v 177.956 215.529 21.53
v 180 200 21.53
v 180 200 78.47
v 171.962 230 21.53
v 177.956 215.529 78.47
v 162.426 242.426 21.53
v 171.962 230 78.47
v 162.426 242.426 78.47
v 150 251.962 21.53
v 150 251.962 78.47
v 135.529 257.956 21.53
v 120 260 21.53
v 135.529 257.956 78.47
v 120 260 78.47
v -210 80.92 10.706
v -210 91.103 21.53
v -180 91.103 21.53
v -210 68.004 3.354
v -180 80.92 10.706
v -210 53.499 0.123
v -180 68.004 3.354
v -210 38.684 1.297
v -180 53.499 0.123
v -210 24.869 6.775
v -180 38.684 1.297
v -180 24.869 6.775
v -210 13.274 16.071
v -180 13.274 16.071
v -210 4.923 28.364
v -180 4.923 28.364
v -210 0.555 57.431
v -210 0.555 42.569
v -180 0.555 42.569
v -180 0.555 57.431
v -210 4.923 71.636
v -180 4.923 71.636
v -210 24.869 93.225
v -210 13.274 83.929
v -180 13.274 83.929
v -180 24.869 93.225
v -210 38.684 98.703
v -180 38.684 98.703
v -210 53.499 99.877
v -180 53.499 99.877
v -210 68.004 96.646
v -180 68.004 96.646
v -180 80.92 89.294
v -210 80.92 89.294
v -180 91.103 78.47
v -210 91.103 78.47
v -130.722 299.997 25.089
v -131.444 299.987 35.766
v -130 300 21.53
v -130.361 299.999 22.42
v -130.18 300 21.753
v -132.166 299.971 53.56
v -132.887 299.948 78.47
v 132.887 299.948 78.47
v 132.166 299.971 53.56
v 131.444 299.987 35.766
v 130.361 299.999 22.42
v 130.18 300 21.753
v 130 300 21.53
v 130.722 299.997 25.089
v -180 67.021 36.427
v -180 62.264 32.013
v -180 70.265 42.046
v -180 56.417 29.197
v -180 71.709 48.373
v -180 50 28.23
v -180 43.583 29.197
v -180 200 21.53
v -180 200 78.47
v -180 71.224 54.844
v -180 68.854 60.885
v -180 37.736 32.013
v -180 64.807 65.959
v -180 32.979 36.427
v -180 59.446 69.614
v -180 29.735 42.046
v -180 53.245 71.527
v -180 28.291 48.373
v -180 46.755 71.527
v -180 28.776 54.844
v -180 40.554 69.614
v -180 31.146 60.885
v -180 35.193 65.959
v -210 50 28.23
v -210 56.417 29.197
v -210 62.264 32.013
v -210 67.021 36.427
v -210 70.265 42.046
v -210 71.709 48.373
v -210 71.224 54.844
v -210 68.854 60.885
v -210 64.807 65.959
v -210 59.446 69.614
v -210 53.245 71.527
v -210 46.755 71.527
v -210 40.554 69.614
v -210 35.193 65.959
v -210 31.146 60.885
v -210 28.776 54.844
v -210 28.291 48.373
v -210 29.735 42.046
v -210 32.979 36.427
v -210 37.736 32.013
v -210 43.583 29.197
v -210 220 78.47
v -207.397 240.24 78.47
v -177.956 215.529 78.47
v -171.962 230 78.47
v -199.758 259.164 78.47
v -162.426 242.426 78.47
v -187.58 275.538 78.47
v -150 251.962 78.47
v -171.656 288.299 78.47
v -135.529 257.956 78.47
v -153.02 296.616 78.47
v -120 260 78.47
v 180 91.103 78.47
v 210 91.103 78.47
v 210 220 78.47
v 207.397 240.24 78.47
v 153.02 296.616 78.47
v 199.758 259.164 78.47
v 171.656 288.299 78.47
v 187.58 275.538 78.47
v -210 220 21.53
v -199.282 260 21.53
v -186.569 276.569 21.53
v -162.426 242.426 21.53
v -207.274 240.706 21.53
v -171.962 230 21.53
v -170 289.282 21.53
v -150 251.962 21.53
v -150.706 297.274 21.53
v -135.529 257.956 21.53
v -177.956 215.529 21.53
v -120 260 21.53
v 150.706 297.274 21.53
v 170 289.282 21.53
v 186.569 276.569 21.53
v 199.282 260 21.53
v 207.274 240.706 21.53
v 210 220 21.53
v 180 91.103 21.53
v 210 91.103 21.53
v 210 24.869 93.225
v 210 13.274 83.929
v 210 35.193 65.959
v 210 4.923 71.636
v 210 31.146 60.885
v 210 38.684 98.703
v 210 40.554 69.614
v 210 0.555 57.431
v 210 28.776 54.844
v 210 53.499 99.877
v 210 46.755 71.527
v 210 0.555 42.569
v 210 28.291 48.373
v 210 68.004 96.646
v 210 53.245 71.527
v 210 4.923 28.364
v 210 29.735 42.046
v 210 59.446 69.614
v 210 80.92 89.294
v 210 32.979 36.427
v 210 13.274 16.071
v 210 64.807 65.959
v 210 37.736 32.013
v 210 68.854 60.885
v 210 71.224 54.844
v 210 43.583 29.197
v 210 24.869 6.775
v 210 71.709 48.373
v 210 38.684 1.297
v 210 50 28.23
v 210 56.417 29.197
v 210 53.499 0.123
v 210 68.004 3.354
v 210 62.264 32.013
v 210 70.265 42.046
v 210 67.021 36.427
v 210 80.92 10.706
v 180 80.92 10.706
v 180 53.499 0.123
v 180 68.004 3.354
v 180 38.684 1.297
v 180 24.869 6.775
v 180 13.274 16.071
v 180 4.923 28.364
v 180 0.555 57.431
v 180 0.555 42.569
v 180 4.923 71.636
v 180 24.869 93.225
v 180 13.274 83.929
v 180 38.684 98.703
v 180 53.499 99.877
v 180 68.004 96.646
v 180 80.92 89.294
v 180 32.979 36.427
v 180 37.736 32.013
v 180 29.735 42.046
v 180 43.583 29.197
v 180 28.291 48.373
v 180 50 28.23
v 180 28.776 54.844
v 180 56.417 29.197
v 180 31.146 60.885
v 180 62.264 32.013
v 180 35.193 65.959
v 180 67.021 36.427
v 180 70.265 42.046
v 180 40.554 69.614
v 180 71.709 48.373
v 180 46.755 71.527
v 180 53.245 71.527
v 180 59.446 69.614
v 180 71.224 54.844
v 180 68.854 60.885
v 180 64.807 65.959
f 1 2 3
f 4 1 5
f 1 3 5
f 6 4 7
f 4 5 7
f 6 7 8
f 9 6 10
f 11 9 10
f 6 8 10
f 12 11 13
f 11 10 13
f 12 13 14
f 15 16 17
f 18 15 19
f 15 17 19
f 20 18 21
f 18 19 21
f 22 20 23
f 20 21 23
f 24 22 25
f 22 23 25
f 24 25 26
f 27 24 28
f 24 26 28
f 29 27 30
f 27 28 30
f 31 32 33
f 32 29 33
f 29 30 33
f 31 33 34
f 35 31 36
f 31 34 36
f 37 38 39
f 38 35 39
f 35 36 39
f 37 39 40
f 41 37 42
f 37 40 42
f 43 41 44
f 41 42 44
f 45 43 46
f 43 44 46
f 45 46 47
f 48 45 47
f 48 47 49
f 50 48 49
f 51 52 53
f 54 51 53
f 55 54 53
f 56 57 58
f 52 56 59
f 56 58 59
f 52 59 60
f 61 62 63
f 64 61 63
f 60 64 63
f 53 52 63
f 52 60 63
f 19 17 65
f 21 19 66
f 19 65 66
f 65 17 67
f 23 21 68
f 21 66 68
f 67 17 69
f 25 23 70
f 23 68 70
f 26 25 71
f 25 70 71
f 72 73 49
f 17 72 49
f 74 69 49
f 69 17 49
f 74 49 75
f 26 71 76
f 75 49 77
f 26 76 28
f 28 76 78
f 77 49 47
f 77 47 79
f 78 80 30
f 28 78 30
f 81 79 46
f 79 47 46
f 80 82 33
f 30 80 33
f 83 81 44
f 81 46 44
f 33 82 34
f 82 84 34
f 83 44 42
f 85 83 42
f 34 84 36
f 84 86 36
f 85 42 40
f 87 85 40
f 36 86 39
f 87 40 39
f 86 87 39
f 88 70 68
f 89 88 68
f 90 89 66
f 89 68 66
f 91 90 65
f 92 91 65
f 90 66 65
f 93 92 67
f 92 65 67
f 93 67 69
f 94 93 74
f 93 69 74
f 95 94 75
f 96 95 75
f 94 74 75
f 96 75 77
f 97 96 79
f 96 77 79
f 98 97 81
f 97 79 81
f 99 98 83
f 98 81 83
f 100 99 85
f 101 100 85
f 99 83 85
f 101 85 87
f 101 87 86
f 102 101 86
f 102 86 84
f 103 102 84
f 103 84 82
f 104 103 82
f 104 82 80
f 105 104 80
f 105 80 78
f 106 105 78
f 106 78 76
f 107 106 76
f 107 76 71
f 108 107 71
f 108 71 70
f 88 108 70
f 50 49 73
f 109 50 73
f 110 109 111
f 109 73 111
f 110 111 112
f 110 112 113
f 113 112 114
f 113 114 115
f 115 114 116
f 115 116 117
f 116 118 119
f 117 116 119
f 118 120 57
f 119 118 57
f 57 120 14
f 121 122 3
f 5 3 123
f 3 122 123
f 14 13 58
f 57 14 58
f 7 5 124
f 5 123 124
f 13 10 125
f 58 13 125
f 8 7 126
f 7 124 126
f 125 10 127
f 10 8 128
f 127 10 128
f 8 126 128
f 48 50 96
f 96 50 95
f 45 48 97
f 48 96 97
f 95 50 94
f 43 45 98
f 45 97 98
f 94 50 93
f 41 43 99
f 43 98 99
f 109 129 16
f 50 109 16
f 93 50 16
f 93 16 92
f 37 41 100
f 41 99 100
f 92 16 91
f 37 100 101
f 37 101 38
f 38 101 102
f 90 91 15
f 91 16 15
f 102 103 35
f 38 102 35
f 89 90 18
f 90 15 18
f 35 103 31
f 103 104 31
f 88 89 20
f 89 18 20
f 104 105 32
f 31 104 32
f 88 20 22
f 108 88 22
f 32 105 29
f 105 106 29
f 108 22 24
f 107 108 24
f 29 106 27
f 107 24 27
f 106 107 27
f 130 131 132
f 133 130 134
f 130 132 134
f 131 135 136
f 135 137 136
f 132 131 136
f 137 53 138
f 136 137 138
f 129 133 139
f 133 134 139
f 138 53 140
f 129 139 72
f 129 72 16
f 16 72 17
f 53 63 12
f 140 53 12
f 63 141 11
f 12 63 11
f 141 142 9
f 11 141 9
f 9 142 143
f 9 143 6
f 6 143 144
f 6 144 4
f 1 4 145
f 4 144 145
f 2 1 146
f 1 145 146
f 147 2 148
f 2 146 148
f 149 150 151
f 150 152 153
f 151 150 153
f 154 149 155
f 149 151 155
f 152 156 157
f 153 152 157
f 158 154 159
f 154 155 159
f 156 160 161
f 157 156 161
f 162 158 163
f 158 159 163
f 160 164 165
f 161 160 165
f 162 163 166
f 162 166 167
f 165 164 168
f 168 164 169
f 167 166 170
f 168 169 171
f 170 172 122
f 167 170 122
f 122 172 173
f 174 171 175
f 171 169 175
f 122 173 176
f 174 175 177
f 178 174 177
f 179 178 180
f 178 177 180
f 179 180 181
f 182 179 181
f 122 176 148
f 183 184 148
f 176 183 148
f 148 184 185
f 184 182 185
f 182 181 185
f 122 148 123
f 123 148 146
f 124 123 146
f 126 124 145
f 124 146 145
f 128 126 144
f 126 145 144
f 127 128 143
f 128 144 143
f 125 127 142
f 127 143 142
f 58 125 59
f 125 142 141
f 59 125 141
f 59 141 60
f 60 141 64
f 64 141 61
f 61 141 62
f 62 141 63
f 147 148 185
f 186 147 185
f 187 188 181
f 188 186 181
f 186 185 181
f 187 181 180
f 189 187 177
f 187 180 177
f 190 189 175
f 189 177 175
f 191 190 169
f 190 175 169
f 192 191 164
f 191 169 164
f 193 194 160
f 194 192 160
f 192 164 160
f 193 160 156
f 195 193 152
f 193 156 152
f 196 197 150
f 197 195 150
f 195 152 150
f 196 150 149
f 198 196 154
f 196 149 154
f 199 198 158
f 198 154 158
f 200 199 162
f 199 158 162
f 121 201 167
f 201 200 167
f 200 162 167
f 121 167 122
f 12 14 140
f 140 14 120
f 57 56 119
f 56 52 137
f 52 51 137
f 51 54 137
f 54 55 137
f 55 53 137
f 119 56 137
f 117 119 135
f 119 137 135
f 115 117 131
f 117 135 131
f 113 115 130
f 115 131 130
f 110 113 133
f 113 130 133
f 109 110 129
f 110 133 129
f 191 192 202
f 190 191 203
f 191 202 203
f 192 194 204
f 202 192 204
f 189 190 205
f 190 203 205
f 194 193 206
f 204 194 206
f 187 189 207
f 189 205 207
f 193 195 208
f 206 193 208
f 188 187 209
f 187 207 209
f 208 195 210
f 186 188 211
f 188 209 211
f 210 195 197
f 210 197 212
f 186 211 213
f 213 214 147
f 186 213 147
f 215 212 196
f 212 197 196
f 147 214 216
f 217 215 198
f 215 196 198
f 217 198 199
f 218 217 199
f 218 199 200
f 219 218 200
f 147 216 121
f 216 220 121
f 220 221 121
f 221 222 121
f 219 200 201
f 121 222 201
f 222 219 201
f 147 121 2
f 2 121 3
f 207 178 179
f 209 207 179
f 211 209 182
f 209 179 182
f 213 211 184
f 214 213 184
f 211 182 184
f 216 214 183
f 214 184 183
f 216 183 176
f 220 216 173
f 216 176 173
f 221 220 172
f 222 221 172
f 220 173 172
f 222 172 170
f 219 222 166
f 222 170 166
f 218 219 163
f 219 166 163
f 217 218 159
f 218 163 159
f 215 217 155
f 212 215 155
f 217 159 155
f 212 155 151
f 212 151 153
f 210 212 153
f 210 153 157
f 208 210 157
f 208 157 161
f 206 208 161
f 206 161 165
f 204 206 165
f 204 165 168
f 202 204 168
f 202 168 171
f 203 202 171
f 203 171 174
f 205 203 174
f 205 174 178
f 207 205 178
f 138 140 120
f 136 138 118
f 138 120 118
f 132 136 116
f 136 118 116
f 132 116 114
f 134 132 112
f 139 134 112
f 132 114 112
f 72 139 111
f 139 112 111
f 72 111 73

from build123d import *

# Parameters (mm, degrees)
EXTRUDE_1_DEPTH     = 100
CUT_EXTRUDE_1_DEPTH = 101
SKETCH_3_OUTSIDE_W  = 207.148
SKETCH_3_OUTSIDE_H  = 407.148
SKETCH_3_OUTSIDE_R  = 21.770153001
CUT_EXTRUDE_2_DEPTH = 421


with BuildPart() as part:
    # Эскиз1 → Бобышка-Вытянуть1 (new body)
    with BuildSketch(Plane.XY):
        with BuildLine():
            Line((-210, 0), (210, 0))
            Line((210, 0), (210, 220))
            ThreePointArc((210, 220), (186.568542495, 276.568542495), (130, 300))
            Line((130, 300), (-130, 300))
            ThreePointArc((-130, 300), (-186.568542495, 276.568542495), (-210, 220))
            Line((-210, 220), (-210, 0))
        make_face()
    extrude(amount=EXTRUDE_1_DEPTH)

    # Эскиз2 → Вырез-Вытянуть1 (cut, through all)
    with BuildSketch(Plane.XY.offset(100)):
        with BuildLine():
            Line((-180, 0), (180, 0))
            Line((180, 0), (180, 200))
            ThreePointArc((180, 200), (162.426406871, 242.426406871), (120, 260))
            Line((120, 260), (-120, 260))
            ThreePointArc((-120, 260), (-162.426406871, 242.426406871), (-180, 200))
            Line((-180, 200), (-180, 0))
        make_face()
    extrude(amount=-CUT_EXTRUDE_1_DEPTH, mode=Mode.SUBTRACT)

    # Эскиз3 outside → Вырез-Вытянуть2 (cut, through all)
    with BuildSketch(Plane(origin=(210, 0, 0), x_dir=(0, 0, -1), z_dir=(1, 0, 0))):
        with Locations((-50, 150)):
            Rectangle(SKETCH_3_OUTSIDE_W, SKETCH_3_OUTSIDE_H)
        with BuildLine():
            Line((-78.46975089, 299.947886103), (-21.53024911, 300))
            Line((-21.53024911, 300), (-21.53024911, 91.103202847))
            ThreePointArc((-21.53024911, 91.103202847), (-50, 0), (-78.46975089, 91.103202847))
            Line((-78.46975089, 91.103202847), (-78.46975089, 299.947886103))
        make_face(mode=Mode.SUBTRACT)
        with Locations((-50, 50)):
            Circle(SKETCH_3_OUTSIDE_R)
    extrude(amount=-CUT_EXTRUDE_2_DEPTH, mode=Mode.SUBTRACT)


solid = part.part
